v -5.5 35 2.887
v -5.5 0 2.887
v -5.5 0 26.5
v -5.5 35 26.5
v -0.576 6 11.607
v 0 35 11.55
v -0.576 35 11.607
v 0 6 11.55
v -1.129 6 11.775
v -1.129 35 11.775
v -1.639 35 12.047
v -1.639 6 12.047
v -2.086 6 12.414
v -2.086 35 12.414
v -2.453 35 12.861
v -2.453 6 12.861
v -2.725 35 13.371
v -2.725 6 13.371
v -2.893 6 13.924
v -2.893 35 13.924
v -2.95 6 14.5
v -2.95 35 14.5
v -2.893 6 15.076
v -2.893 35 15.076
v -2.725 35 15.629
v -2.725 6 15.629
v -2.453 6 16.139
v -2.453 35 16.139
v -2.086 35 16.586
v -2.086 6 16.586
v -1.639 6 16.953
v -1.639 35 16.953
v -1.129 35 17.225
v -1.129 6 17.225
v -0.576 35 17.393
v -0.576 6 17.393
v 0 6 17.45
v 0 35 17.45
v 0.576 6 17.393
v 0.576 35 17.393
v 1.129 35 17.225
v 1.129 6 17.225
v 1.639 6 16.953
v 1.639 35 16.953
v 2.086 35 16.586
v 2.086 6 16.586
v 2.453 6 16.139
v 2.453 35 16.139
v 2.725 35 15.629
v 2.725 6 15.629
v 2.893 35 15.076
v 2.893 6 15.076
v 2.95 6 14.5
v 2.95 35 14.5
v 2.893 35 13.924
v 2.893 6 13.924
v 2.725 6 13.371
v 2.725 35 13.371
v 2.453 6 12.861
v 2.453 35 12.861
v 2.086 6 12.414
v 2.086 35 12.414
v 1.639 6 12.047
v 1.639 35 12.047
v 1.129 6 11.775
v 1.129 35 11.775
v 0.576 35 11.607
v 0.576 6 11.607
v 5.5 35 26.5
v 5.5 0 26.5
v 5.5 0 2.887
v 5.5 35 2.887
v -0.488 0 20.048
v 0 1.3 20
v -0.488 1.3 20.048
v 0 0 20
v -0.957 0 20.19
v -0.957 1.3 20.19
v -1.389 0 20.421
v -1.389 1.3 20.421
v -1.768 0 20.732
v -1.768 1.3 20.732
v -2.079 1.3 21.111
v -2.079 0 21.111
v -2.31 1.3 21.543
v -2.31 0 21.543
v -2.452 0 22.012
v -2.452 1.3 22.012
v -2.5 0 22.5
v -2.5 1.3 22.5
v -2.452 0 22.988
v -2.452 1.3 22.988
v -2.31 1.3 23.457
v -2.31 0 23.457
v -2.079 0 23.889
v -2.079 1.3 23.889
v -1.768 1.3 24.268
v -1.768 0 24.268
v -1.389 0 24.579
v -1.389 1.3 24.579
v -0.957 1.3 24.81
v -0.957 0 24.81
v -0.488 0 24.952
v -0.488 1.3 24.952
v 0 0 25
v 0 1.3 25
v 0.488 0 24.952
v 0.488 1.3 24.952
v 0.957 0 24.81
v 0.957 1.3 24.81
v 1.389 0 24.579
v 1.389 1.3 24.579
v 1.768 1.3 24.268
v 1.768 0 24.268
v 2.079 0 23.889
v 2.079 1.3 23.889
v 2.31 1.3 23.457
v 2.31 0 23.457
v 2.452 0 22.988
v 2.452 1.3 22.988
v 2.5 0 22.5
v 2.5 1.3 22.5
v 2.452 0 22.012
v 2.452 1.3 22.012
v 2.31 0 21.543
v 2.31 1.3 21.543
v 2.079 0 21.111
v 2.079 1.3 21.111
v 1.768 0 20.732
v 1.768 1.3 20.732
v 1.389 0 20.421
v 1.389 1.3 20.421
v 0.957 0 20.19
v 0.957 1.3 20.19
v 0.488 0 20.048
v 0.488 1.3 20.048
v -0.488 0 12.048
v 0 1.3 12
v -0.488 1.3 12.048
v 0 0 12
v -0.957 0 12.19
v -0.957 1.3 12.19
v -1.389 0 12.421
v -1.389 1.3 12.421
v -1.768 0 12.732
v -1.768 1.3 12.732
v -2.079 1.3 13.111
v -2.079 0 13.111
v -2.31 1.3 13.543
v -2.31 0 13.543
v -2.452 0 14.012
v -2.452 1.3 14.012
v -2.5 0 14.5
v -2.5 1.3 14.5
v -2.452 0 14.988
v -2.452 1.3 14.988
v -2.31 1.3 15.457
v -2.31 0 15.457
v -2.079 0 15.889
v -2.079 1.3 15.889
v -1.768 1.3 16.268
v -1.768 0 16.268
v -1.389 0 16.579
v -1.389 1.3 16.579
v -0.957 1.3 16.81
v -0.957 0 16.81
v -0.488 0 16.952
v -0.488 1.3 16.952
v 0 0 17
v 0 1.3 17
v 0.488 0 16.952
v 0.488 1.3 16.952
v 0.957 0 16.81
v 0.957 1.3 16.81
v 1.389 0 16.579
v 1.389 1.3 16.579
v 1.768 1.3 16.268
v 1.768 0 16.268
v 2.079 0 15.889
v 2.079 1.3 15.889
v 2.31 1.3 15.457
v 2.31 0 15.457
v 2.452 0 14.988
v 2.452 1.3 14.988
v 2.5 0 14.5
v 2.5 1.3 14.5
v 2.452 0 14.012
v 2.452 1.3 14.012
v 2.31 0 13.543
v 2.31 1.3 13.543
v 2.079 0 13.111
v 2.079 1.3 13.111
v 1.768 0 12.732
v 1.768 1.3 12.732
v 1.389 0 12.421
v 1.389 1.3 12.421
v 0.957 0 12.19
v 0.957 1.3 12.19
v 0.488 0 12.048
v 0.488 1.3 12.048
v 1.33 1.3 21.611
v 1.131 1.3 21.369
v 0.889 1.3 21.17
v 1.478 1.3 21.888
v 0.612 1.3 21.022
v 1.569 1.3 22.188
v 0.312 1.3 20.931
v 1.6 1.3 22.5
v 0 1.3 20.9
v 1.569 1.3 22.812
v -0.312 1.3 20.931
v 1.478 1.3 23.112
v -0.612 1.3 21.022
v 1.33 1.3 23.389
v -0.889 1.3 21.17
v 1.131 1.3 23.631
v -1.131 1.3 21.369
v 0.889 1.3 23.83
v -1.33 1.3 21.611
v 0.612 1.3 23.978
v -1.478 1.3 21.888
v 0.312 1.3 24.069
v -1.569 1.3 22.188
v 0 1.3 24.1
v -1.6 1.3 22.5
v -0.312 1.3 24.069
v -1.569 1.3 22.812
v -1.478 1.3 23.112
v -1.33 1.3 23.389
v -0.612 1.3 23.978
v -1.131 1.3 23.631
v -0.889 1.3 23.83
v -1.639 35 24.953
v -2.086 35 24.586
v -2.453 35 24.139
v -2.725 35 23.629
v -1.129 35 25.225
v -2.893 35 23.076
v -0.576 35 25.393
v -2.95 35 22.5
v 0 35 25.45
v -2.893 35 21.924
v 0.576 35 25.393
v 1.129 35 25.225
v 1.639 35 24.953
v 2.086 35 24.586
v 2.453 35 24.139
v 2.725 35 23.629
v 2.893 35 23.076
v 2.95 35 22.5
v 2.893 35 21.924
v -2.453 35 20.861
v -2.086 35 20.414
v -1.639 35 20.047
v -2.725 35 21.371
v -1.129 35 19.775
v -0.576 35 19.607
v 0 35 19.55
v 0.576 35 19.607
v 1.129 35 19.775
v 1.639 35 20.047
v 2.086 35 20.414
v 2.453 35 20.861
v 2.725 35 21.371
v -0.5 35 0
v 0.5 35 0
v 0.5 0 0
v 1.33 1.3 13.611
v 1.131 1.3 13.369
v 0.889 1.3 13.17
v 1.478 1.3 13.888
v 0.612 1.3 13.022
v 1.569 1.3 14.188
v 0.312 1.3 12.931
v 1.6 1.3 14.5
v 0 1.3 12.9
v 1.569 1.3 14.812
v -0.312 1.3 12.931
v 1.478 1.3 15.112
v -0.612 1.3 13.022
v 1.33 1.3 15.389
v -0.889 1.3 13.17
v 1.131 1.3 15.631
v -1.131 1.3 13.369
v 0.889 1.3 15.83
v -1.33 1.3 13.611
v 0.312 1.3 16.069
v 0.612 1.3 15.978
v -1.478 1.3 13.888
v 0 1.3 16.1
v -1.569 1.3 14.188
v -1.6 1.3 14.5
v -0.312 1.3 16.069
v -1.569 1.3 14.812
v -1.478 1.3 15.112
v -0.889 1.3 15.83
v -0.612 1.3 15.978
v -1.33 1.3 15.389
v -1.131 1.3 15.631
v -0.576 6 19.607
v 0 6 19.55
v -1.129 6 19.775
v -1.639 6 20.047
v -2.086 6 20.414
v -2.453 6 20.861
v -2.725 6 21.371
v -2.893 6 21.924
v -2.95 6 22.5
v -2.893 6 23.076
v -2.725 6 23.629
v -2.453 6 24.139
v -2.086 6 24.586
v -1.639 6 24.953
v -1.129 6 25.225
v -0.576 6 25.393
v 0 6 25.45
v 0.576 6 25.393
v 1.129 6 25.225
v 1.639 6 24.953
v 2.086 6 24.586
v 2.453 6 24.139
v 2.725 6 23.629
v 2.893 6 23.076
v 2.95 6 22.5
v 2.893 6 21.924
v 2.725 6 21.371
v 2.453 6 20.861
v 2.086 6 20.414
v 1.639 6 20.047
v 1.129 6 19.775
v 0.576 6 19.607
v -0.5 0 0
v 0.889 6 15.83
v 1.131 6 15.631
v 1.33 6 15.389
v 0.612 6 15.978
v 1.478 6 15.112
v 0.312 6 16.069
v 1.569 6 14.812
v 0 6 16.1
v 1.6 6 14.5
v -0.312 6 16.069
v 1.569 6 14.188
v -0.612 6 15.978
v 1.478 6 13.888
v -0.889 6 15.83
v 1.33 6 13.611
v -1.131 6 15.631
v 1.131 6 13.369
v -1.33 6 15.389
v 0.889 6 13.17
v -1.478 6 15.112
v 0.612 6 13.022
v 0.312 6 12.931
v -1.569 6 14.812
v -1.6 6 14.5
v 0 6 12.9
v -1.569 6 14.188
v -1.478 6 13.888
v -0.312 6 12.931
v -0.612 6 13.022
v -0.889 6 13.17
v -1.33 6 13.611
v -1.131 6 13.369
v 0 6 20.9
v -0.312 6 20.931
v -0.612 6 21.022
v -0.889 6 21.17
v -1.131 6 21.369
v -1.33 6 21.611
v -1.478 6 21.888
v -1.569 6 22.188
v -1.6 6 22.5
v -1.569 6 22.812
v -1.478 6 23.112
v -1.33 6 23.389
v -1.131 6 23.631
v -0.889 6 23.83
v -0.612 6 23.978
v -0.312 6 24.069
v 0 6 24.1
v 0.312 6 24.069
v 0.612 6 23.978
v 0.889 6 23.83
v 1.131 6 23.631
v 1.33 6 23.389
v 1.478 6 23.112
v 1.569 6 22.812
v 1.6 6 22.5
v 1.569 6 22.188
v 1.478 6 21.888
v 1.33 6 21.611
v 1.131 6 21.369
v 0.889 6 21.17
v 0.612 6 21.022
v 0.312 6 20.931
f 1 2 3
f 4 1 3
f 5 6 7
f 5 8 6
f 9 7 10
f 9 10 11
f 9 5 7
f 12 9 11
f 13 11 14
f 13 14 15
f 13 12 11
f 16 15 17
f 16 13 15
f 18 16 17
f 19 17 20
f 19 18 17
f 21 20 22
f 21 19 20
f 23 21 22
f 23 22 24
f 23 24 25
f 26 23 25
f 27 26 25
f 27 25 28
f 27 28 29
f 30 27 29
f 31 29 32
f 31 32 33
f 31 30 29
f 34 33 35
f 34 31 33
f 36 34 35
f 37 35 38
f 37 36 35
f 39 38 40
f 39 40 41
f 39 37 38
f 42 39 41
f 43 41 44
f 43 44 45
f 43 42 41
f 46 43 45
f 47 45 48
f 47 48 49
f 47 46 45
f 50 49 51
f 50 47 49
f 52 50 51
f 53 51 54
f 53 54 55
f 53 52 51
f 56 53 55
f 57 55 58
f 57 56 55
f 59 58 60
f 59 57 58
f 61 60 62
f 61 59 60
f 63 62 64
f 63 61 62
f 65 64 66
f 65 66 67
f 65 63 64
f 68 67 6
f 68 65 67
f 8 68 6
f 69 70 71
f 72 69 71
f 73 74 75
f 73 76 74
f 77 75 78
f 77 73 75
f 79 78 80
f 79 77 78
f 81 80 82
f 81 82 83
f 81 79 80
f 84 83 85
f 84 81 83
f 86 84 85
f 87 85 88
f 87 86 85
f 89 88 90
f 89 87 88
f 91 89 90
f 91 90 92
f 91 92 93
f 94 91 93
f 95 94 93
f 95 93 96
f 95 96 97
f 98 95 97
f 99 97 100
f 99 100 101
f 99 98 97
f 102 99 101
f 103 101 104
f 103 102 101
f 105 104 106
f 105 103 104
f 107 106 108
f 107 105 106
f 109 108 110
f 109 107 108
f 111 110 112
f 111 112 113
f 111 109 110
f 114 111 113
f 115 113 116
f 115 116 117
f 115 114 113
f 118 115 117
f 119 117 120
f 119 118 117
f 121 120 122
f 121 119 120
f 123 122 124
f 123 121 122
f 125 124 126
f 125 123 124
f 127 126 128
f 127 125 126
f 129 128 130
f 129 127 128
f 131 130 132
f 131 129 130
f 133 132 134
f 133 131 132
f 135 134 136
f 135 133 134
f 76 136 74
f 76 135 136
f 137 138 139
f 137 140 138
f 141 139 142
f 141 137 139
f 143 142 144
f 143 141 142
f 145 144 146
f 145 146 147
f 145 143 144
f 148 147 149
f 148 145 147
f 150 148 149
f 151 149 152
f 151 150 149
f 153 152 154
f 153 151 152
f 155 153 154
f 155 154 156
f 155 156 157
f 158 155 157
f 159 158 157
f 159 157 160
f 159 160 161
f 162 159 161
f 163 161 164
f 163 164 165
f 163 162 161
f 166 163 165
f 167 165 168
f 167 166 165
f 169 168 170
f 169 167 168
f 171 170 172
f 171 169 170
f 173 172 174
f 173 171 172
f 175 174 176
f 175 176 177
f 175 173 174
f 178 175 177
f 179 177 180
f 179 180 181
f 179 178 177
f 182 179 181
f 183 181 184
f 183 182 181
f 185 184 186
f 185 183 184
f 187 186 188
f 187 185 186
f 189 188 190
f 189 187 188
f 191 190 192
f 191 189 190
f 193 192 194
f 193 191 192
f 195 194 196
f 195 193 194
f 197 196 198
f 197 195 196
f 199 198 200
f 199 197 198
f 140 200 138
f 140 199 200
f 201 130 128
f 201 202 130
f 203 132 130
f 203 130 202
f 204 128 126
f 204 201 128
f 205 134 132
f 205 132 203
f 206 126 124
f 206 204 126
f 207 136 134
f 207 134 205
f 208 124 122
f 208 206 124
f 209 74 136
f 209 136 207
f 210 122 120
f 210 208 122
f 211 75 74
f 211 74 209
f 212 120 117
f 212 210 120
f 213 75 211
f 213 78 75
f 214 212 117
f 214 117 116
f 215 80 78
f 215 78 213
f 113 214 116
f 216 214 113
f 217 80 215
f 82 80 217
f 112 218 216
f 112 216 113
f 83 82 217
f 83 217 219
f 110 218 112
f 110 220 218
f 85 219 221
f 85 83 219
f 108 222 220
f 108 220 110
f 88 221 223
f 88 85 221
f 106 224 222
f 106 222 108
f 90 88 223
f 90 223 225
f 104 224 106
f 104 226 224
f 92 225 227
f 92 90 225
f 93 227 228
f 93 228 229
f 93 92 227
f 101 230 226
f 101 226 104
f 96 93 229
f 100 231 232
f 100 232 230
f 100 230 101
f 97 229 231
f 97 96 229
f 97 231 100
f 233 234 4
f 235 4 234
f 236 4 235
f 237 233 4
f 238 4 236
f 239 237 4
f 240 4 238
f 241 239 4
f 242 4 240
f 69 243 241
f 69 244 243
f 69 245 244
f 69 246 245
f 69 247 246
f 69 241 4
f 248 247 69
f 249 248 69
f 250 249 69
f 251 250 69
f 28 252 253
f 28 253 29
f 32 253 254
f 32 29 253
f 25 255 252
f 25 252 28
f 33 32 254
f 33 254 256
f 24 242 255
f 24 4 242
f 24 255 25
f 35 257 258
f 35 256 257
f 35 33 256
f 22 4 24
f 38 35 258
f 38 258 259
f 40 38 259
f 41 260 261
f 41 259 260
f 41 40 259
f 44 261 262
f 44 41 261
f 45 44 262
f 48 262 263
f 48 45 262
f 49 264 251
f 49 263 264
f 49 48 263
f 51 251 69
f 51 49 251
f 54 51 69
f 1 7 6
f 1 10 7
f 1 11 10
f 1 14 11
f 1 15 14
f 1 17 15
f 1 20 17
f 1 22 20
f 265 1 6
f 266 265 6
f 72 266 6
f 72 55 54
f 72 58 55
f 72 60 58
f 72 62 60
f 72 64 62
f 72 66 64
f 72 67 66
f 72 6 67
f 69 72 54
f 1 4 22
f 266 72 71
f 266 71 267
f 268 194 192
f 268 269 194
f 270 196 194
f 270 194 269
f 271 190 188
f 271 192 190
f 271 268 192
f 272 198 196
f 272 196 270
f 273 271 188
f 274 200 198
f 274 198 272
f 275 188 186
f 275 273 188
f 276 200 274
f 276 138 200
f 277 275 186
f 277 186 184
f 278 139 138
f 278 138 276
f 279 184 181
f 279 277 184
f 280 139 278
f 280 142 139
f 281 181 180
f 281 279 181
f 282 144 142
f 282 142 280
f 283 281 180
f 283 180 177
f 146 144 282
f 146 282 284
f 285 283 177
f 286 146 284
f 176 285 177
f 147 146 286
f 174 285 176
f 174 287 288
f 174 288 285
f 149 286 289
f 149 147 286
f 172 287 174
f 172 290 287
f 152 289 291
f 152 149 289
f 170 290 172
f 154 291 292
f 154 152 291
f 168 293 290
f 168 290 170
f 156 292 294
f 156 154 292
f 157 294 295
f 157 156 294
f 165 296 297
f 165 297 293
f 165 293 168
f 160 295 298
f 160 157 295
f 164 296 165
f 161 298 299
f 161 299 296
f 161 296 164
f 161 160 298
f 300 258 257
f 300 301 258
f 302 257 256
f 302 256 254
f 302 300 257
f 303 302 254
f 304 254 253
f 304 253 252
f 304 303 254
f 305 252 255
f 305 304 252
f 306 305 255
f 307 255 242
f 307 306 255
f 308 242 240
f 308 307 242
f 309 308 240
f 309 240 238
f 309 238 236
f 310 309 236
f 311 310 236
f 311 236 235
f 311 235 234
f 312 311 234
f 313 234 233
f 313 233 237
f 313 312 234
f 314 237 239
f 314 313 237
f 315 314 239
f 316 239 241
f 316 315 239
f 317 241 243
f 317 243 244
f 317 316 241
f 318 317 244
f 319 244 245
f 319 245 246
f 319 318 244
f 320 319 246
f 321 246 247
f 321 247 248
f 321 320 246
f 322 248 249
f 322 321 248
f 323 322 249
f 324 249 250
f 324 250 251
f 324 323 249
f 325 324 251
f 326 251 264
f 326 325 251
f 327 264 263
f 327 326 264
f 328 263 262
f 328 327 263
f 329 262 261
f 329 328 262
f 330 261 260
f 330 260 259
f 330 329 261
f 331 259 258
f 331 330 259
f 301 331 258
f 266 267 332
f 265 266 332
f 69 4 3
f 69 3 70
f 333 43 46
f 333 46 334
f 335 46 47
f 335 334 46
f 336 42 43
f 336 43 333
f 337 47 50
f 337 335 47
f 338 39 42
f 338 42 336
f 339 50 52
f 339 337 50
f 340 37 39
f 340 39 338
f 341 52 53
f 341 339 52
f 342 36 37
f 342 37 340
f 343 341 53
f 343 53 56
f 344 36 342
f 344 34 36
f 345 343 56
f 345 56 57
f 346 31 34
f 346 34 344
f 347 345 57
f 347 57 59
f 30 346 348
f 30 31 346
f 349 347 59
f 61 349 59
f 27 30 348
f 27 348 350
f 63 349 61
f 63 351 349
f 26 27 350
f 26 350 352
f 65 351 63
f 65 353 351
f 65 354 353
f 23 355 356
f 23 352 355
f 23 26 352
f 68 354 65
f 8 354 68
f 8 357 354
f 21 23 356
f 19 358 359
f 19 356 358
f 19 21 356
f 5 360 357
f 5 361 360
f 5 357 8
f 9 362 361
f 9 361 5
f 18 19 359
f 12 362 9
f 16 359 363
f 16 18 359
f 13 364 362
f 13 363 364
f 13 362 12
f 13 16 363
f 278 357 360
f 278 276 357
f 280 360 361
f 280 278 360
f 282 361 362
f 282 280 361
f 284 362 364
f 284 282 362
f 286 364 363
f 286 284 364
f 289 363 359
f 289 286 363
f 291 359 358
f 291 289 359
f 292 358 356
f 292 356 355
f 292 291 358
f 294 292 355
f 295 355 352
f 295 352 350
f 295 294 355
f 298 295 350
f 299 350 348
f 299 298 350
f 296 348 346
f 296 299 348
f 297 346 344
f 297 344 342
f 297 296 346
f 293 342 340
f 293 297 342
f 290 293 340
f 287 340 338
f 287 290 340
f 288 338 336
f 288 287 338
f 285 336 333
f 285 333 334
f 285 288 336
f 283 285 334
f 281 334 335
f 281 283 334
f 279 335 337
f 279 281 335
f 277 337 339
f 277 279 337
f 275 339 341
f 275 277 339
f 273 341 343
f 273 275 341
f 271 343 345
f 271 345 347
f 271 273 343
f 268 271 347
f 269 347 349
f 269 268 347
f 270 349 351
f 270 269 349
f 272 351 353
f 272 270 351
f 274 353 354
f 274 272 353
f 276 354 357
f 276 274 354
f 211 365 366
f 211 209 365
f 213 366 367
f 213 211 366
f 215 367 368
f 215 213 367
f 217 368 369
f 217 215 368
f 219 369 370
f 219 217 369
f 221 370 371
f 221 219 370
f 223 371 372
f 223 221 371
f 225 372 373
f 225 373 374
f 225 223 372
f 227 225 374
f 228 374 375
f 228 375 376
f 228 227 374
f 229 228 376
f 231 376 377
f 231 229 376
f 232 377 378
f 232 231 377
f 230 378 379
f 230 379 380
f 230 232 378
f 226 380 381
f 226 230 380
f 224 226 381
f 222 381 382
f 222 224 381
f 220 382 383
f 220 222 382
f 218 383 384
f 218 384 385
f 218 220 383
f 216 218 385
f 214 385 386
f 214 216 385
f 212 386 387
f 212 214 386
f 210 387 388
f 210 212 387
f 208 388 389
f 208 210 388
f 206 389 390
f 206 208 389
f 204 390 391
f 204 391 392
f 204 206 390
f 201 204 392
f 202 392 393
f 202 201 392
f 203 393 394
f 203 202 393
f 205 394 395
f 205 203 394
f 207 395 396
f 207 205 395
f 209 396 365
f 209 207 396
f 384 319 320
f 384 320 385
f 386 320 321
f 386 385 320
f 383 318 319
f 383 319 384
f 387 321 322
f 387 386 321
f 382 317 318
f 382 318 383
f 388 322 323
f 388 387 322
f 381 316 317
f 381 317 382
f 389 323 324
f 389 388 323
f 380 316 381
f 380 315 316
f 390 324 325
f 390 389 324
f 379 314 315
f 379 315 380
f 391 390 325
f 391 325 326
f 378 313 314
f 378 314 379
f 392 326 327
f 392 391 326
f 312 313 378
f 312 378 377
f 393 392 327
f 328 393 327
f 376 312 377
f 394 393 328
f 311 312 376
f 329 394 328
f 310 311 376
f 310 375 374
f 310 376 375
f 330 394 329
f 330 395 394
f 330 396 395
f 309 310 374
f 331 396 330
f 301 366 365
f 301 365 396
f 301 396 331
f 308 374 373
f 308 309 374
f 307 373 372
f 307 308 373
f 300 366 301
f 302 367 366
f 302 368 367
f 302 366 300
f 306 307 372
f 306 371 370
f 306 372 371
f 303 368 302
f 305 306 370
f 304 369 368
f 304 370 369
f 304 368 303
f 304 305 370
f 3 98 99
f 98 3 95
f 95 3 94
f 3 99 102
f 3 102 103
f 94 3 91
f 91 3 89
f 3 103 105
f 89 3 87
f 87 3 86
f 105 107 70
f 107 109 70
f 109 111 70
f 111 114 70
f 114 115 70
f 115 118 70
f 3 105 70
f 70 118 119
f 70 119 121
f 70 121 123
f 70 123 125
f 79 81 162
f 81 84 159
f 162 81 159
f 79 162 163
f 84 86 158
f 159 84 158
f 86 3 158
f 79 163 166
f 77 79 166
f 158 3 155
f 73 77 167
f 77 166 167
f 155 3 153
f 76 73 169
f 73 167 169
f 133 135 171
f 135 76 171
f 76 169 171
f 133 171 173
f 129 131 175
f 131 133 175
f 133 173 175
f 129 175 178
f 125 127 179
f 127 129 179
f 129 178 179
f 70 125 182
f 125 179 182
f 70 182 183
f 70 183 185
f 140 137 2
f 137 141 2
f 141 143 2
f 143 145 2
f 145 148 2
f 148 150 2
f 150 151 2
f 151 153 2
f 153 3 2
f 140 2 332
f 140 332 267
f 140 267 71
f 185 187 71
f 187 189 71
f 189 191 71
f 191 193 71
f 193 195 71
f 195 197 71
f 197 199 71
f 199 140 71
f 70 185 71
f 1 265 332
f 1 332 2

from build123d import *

# Parameters (mm, degrees)
BOSS_EXTRUDE1_DEPTH = 35


with BuildPart() as part:
    # Sketch1 → Boss-Extrude1 (new body)
    with BuildSketch(Plane(origin=(0, 0, 0), x_dir=(1, 0, 0), z_dir=(0, 1, 0))):
        Polygon((-5.5, -26.5), (5.5, -26.5), (5.5, -2.886751346), (0.5, 0), (-0.5, 0), (-5.5, -2.886751346), align=None)
    extrude(amount=BOSS_EXTRUDE1_DEPTH)

    # Sketch2 → Cut-Revolve1 (revolve, cut)
    with BuildSketch(Plane(origin=(0, 0, 0), x_dir=(0, 0, -1), z_dir=(1, 0, 0))):
        Polygon((-14.5, 35), (-11.55, 35), (-11.55, 6), (-12.9, 6), (-12.9, 1.3), (-12, 1.3), (-12, 0), (-14.5, 0), align=None)
    revolve(axis=Axis((0, 0, 14.5), (0, 1, 0)), mode=Mode.SUBTRACT)

    # Sketch3 → Cut-Revolve2 (revolve, cut)
    with BuildSketch(Plane(origin=(0, 0, 0), x_dir=(0, 0, -1), z_dir=(1, 0, 0))):
        Polygon((-22.5, 35), (-19.55, 35), (-19.55, 6), (-20.9, 6), (-20.9, 1.3), (-20, 1.3), (-20, 0), (-22.5, 0), align=None)
    revolve(axis=Axis((0, 0, 22.5), (0, 1, 0)), mode=Mode.SUBTRACT)


solid = part.part
